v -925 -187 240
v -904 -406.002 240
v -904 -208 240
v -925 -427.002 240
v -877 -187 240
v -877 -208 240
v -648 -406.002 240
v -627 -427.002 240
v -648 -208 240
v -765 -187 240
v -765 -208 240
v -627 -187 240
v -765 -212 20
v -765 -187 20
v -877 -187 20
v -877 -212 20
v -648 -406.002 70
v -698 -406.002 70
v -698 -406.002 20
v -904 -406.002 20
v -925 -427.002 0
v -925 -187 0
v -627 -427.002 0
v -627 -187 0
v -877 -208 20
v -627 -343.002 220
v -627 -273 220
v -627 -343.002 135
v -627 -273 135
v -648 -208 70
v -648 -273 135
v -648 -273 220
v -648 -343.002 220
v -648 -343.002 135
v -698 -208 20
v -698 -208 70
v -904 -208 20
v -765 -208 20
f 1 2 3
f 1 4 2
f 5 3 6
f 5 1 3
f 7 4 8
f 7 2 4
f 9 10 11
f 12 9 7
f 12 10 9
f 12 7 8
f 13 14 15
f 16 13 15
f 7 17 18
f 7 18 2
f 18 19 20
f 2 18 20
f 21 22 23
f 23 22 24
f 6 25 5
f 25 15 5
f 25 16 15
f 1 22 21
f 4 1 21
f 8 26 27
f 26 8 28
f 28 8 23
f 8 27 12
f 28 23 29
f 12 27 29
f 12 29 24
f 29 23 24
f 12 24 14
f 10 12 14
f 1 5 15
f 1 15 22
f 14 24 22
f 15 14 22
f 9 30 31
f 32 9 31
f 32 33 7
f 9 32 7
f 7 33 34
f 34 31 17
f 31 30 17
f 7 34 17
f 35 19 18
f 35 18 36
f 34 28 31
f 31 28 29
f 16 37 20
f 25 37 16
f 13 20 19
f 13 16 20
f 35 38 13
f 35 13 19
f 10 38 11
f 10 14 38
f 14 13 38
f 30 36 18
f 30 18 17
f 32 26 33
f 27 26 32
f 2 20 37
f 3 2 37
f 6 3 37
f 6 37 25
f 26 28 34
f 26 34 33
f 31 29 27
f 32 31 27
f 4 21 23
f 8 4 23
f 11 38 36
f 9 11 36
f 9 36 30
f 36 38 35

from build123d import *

# Parameters (mm, degrees)
F3_DEPTH  = 240
F5_DEPTH  = 20
F6_W      = 112
F6_H      = 241.106075
F7_DEPTH  = 25
F8_W      = 70.001994
F8_H      = 85
F9_DEPTH  = 25
F10_W     = 50
F10_H     = 198.001994
F11_DEPTH = 50


with BuildPart() as f3:
    # F2 (on face) → F3 (new body)
    with BuildSketch(Plane.XY):
        Polygon((-627, -343.001994), (-627, -273), (-627, -187), (-765, -187), (-877, -187), (-925, -187), (-925, -427.001994), (-627, -427.001994), align=None)
        Polygon((-765, -208), (-648, -208), (-648, -273), (-648, -343.001994), (-648, -406.001994), (-904, -406.001994), (-904, -208), (-877, -208), align=None, mode=Mode.SUBTRACT)
    extrude(amount=F3_DEPTH)

    # F4 (on face) → F5 (join)
    with BuildSketch(Plane.XY):
        Polygon((-648, -273), (-648, -208), (-765, -208), (-877, -208), (-904, -208), (-904, -406.001994), (-648, -406.001994), (-648, -343.001994), align=None)
    extrude(amount=F5_DEPTH)

    # F6 (on face) → F7 (cut)
    with BuildSketch(Plane(origin=(0, -187, 0), x_dir=(-1, 0, 0), z_dir=(0, 1, 0))):
        with Locations((821, 140.553037)):
            Rectangle(F6_W, F6_H)
    extrude(amount=-F7_DEPTH, mode=Mode.SUBTRACT)

    # F8 (on face) → F9 (cut)
    with BuildSketch(Plane.YZ.offset(-627)):
        with Locations((-308.000997, 177.5)):
            Rectangle(F8_W, F8_H)
    extrude(amount=-F9_DEPTH, mode=Mode.SUBTRACT)

    # F10 (on face) → F11 (join)
    with BuildSketch(Plane.XY.offset(20)):
        with Locations((-673, -307.000997)):
            Rectangle(F10_W, F10_H)
    extrude(amount=F11_DEPTH)


solid = f3.part
